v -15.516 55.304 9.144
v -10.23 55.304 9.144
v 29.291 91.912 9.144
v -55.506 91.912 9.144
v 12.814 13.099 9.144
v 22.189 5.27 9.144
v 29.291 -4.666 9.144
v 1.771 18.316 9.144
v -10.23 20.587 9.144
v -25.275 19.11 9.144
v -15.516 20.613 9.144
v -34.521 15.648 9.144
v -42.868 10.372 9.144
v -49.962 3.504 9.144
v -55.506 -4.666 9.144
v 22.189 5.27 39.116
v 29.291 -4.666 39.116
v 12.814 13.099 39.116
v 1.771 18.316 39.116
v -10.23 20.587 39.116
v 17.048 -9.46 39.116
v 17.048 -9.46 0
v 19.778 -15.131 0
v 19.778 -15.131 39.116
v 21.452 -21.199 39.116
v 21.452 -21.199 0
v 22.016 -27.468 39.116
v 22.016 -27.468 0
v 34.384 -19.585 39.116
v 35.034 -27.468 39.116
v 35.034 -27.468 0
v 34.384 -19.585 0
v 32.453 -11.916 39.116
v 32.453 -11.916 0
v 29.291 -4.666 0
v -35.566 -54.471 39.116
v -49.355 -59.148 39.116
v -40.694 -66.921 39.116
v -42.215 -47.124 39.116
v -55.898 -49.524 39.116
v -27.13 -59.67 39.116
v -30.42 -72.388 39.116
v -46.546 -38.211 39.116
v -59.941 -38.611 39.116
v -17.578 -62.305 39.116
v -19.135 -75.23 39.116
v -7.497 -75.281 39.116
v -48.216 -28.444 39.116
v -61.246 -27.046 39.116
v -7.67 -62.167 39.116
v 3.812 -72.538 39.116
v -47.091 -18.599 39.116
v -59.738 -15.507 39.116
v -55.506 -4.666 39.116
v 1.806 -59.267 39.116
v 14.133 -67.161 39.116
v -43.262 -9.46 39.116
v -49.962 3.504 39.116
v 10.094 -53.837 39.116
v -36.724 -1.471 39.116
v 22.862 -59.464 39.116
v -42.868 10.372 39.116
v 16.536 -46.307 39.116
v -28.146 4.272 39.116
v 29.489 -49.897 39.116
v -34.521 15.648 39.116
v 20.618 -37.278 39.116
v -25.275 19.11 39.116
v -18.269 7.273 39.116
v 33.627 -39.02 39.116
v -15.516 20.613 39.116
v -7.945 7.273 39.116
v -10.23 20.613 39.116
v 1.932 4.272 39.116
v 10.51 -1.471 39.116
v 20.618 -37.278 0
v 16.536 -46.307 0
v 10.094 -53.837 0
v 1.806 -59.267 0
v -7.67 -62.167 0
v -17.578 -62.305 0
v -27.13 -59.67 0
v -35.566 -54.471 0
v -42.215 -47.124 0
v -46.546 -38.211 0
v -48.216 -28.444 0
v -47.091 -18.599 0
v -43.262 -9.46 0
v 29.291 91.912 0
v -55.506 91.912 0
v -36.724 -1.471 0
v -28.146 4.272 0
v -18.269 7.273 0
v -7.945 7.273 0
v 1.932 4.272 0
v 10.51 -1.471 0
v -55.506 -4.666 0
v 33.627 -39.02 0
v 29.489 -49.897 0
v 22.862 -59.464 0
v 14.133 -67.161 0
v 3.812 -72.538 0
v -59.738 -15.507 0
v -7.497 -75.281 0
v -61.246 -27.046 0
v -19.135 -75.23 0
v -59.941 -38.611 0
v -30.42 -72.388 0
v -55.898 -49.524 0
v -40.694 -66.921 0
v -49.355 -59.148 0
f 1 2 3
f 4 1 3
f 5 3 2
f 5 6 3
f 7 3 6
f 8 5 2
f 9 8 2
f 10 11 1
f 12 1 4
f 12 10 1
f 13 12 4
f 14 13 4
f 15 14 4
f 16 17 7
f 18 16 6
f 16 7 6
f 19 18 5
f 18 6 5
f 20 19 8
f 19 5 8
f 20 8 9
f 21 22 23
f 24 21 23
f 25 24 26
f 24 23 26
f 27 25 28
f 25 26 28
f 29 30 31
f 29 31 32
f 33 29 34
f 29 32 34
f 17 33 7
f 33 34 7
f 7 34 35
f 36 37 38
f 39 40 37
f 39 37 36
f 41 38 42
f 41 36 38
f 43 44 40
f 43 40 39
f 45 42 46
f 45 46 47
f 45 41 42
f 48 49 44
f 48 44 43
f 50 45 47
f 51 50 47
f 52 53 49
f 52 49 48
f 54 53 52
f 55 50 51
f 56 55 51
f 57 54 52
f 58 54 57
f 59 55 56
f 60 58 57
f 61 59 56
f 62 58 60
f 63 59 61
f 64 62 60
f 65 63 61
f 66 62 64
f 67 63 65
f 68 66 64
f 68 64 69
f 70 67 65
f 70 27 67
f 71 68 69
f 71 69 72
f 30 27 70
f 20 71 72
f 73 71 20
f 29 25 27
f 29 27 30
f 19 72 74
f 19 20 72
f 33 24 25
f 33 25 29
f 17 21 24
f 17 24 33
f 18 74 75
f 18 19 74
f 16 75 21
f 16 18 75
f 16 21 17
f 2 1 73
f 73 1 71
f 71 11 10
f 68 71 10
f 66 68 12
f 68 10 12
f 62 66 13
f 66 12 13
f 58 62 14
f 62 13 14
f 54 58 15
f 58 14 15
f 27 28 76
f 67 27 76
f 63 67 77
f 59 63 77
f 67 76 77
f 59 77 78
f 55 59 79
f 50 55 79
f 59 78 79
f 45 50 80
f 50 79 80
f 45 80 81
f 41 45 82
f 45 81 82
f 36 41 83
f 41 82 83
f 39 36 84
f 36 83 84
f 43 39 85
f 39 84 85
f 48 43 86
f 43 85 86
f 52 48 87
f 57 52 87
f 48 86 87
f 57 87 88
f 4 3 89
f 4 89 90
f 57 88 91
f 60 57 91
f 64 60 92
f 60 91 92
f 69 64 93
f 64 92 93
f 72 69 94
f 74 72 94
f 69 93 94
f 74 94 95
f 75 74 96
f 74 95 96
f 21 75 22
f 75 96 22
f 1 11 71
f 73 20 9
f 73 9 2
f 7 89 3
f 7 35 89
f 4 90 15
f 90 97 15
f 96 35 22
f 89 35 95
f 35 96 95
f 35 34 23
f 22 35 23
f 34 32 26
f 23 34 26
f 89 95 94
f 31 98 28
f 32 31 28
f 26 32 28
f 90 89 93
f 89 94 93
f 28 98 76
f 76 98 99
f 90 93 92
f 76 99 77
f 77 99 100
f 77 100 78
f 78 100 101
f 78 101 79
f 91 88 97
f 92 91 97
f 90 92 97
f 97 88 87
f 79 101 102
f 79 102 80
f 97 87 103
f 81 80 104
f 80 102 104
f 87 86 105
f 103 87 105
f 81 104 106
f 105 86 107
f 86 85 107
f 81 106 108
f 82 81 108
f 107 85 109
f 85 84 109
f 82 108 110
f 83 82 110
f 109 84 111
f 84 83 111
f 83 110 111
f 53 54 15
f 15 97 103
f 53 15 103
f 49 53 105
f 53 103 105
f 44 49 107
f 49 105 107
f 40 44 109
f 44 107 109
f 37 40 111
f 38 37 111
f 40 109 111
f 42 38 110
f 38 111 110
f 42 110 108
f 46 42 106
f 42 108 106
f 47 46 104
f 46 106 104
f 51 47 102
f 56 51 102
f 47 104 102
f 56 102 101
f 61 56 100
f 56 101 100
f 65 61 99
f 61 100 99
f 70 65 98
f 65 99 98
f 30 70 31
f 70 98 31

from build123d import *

# Parameters (mm, degrees)
F1_DEPTH  = 39.116
F2_DEPTH  = 9.144
F2_FACE_W = 84.796926
F2_FACE_H = 9.144
F3_DEPTH  = 21.59
F4_W      = 5.286065
F4_H      = 34.716484
F5_DEPTH  = 29.972
F7_DEPTH  = 49.784


with BuildPart() as f1:
    # F0 (on Top) → F1 (new body)
    with BuildSketch(Plane.XY):
        with BuildLine():
            ThreePointArc((29.291412, -4.666115), (-13.107051, 20.673092), (-55.505514, -4.666115))
            Line((-55.505514, -4.666115), (-55.505514, -9.459872))
            Line((-55.505514, -9.459872), (-43.261834, -9.459872))
            ThreePointArc((-43.261834, -9.459872), (-13.107051, 7.654781), (17.047732, -9.459872))
            Line((17.047732, -9.459872), (29.291412, -9.459872))
            Line((29.291412, -9.459872), (29.291412, -4.666115))
        make_face()
        with BuildLine():
            Line((-55.505514, -9.459872), (-55.505514, -4.666115))
            ThreePointArc((-55.505514, -4.666115), (-24.863895, -74.151052), (35.033861, -27.467821))
            ThreePointArc((35.033861, -27.467821), (33.57618, -15.710977), (29.291412, -4.666115))
            Line((29.291412, -4.666115), (29.291412, -9.459872))
            Line((29.291412, -9.459872), (17.047732, -9.459872))
            ThreePointArc((17.047732, -9.459872), (20.750825, -18.127512), (22.015551, -27.467821))
            ThreePointArc((22.015551, -27.467821), (-22.44736, -61.325697), (-43.261834, -9.459872))
            Line((-43.261834, -9.459872), (-55.505514, -9.459872))
        make_face()
    extrude(amount=F1_DEPTH)

    # F0 (on Top) → F2 (join)
    with BuildSketch(Plane.XY):
        with BuildLine():
            Line((29.291412, 70.322178), (-55.505514, 70.322178))
            Line((-55.505514, 70.322178), (-55.505514, -4.666115))
            ThreePointArc((-55.505514, -4.666115), (-13.107051, 20.673092), (29.291412, -4.666115))
            Line((29.291412, -4.666115), (29.291412, 70.322178))
        make_face()
    extrude(amount=F2_DEPTH)

    # F2_face (on face) → F3 (join)
    with BuildSketch(Plane(origin=(-13.107051, 70.322178, 4.572), x_dir=(-1, 0, 0), z_dir=(0, 1, 0))):
        Rectangle(F2_FACE_W, F2_FACE_H)
    extrude(amount=F3_DEPTH)

    # F4 (on face) → F5 (join)
    with BuildSketch(Plane.XY.offset(9.144)):
        with Locations((-12.872688, 37.945265)):
            Rectangle(F4_W, F4_H)
    extrude(amount=F5_DEPTH)

    # F6 (on face) → F7 (cut)
    with BuildSketch(Plane(origin=(-15.515721, 0, 0), x_dir=(0, -1, 0), z_dir=(-1, 0, 0))):
        Polygon((-55.303507, 9.144), (-20.612797, 39.116), (-55.303507, 39.116), align=None)
    extrude(amount=-F7_DEPTH, mode=Mode.SUBTRACT)


solid = f1.part
